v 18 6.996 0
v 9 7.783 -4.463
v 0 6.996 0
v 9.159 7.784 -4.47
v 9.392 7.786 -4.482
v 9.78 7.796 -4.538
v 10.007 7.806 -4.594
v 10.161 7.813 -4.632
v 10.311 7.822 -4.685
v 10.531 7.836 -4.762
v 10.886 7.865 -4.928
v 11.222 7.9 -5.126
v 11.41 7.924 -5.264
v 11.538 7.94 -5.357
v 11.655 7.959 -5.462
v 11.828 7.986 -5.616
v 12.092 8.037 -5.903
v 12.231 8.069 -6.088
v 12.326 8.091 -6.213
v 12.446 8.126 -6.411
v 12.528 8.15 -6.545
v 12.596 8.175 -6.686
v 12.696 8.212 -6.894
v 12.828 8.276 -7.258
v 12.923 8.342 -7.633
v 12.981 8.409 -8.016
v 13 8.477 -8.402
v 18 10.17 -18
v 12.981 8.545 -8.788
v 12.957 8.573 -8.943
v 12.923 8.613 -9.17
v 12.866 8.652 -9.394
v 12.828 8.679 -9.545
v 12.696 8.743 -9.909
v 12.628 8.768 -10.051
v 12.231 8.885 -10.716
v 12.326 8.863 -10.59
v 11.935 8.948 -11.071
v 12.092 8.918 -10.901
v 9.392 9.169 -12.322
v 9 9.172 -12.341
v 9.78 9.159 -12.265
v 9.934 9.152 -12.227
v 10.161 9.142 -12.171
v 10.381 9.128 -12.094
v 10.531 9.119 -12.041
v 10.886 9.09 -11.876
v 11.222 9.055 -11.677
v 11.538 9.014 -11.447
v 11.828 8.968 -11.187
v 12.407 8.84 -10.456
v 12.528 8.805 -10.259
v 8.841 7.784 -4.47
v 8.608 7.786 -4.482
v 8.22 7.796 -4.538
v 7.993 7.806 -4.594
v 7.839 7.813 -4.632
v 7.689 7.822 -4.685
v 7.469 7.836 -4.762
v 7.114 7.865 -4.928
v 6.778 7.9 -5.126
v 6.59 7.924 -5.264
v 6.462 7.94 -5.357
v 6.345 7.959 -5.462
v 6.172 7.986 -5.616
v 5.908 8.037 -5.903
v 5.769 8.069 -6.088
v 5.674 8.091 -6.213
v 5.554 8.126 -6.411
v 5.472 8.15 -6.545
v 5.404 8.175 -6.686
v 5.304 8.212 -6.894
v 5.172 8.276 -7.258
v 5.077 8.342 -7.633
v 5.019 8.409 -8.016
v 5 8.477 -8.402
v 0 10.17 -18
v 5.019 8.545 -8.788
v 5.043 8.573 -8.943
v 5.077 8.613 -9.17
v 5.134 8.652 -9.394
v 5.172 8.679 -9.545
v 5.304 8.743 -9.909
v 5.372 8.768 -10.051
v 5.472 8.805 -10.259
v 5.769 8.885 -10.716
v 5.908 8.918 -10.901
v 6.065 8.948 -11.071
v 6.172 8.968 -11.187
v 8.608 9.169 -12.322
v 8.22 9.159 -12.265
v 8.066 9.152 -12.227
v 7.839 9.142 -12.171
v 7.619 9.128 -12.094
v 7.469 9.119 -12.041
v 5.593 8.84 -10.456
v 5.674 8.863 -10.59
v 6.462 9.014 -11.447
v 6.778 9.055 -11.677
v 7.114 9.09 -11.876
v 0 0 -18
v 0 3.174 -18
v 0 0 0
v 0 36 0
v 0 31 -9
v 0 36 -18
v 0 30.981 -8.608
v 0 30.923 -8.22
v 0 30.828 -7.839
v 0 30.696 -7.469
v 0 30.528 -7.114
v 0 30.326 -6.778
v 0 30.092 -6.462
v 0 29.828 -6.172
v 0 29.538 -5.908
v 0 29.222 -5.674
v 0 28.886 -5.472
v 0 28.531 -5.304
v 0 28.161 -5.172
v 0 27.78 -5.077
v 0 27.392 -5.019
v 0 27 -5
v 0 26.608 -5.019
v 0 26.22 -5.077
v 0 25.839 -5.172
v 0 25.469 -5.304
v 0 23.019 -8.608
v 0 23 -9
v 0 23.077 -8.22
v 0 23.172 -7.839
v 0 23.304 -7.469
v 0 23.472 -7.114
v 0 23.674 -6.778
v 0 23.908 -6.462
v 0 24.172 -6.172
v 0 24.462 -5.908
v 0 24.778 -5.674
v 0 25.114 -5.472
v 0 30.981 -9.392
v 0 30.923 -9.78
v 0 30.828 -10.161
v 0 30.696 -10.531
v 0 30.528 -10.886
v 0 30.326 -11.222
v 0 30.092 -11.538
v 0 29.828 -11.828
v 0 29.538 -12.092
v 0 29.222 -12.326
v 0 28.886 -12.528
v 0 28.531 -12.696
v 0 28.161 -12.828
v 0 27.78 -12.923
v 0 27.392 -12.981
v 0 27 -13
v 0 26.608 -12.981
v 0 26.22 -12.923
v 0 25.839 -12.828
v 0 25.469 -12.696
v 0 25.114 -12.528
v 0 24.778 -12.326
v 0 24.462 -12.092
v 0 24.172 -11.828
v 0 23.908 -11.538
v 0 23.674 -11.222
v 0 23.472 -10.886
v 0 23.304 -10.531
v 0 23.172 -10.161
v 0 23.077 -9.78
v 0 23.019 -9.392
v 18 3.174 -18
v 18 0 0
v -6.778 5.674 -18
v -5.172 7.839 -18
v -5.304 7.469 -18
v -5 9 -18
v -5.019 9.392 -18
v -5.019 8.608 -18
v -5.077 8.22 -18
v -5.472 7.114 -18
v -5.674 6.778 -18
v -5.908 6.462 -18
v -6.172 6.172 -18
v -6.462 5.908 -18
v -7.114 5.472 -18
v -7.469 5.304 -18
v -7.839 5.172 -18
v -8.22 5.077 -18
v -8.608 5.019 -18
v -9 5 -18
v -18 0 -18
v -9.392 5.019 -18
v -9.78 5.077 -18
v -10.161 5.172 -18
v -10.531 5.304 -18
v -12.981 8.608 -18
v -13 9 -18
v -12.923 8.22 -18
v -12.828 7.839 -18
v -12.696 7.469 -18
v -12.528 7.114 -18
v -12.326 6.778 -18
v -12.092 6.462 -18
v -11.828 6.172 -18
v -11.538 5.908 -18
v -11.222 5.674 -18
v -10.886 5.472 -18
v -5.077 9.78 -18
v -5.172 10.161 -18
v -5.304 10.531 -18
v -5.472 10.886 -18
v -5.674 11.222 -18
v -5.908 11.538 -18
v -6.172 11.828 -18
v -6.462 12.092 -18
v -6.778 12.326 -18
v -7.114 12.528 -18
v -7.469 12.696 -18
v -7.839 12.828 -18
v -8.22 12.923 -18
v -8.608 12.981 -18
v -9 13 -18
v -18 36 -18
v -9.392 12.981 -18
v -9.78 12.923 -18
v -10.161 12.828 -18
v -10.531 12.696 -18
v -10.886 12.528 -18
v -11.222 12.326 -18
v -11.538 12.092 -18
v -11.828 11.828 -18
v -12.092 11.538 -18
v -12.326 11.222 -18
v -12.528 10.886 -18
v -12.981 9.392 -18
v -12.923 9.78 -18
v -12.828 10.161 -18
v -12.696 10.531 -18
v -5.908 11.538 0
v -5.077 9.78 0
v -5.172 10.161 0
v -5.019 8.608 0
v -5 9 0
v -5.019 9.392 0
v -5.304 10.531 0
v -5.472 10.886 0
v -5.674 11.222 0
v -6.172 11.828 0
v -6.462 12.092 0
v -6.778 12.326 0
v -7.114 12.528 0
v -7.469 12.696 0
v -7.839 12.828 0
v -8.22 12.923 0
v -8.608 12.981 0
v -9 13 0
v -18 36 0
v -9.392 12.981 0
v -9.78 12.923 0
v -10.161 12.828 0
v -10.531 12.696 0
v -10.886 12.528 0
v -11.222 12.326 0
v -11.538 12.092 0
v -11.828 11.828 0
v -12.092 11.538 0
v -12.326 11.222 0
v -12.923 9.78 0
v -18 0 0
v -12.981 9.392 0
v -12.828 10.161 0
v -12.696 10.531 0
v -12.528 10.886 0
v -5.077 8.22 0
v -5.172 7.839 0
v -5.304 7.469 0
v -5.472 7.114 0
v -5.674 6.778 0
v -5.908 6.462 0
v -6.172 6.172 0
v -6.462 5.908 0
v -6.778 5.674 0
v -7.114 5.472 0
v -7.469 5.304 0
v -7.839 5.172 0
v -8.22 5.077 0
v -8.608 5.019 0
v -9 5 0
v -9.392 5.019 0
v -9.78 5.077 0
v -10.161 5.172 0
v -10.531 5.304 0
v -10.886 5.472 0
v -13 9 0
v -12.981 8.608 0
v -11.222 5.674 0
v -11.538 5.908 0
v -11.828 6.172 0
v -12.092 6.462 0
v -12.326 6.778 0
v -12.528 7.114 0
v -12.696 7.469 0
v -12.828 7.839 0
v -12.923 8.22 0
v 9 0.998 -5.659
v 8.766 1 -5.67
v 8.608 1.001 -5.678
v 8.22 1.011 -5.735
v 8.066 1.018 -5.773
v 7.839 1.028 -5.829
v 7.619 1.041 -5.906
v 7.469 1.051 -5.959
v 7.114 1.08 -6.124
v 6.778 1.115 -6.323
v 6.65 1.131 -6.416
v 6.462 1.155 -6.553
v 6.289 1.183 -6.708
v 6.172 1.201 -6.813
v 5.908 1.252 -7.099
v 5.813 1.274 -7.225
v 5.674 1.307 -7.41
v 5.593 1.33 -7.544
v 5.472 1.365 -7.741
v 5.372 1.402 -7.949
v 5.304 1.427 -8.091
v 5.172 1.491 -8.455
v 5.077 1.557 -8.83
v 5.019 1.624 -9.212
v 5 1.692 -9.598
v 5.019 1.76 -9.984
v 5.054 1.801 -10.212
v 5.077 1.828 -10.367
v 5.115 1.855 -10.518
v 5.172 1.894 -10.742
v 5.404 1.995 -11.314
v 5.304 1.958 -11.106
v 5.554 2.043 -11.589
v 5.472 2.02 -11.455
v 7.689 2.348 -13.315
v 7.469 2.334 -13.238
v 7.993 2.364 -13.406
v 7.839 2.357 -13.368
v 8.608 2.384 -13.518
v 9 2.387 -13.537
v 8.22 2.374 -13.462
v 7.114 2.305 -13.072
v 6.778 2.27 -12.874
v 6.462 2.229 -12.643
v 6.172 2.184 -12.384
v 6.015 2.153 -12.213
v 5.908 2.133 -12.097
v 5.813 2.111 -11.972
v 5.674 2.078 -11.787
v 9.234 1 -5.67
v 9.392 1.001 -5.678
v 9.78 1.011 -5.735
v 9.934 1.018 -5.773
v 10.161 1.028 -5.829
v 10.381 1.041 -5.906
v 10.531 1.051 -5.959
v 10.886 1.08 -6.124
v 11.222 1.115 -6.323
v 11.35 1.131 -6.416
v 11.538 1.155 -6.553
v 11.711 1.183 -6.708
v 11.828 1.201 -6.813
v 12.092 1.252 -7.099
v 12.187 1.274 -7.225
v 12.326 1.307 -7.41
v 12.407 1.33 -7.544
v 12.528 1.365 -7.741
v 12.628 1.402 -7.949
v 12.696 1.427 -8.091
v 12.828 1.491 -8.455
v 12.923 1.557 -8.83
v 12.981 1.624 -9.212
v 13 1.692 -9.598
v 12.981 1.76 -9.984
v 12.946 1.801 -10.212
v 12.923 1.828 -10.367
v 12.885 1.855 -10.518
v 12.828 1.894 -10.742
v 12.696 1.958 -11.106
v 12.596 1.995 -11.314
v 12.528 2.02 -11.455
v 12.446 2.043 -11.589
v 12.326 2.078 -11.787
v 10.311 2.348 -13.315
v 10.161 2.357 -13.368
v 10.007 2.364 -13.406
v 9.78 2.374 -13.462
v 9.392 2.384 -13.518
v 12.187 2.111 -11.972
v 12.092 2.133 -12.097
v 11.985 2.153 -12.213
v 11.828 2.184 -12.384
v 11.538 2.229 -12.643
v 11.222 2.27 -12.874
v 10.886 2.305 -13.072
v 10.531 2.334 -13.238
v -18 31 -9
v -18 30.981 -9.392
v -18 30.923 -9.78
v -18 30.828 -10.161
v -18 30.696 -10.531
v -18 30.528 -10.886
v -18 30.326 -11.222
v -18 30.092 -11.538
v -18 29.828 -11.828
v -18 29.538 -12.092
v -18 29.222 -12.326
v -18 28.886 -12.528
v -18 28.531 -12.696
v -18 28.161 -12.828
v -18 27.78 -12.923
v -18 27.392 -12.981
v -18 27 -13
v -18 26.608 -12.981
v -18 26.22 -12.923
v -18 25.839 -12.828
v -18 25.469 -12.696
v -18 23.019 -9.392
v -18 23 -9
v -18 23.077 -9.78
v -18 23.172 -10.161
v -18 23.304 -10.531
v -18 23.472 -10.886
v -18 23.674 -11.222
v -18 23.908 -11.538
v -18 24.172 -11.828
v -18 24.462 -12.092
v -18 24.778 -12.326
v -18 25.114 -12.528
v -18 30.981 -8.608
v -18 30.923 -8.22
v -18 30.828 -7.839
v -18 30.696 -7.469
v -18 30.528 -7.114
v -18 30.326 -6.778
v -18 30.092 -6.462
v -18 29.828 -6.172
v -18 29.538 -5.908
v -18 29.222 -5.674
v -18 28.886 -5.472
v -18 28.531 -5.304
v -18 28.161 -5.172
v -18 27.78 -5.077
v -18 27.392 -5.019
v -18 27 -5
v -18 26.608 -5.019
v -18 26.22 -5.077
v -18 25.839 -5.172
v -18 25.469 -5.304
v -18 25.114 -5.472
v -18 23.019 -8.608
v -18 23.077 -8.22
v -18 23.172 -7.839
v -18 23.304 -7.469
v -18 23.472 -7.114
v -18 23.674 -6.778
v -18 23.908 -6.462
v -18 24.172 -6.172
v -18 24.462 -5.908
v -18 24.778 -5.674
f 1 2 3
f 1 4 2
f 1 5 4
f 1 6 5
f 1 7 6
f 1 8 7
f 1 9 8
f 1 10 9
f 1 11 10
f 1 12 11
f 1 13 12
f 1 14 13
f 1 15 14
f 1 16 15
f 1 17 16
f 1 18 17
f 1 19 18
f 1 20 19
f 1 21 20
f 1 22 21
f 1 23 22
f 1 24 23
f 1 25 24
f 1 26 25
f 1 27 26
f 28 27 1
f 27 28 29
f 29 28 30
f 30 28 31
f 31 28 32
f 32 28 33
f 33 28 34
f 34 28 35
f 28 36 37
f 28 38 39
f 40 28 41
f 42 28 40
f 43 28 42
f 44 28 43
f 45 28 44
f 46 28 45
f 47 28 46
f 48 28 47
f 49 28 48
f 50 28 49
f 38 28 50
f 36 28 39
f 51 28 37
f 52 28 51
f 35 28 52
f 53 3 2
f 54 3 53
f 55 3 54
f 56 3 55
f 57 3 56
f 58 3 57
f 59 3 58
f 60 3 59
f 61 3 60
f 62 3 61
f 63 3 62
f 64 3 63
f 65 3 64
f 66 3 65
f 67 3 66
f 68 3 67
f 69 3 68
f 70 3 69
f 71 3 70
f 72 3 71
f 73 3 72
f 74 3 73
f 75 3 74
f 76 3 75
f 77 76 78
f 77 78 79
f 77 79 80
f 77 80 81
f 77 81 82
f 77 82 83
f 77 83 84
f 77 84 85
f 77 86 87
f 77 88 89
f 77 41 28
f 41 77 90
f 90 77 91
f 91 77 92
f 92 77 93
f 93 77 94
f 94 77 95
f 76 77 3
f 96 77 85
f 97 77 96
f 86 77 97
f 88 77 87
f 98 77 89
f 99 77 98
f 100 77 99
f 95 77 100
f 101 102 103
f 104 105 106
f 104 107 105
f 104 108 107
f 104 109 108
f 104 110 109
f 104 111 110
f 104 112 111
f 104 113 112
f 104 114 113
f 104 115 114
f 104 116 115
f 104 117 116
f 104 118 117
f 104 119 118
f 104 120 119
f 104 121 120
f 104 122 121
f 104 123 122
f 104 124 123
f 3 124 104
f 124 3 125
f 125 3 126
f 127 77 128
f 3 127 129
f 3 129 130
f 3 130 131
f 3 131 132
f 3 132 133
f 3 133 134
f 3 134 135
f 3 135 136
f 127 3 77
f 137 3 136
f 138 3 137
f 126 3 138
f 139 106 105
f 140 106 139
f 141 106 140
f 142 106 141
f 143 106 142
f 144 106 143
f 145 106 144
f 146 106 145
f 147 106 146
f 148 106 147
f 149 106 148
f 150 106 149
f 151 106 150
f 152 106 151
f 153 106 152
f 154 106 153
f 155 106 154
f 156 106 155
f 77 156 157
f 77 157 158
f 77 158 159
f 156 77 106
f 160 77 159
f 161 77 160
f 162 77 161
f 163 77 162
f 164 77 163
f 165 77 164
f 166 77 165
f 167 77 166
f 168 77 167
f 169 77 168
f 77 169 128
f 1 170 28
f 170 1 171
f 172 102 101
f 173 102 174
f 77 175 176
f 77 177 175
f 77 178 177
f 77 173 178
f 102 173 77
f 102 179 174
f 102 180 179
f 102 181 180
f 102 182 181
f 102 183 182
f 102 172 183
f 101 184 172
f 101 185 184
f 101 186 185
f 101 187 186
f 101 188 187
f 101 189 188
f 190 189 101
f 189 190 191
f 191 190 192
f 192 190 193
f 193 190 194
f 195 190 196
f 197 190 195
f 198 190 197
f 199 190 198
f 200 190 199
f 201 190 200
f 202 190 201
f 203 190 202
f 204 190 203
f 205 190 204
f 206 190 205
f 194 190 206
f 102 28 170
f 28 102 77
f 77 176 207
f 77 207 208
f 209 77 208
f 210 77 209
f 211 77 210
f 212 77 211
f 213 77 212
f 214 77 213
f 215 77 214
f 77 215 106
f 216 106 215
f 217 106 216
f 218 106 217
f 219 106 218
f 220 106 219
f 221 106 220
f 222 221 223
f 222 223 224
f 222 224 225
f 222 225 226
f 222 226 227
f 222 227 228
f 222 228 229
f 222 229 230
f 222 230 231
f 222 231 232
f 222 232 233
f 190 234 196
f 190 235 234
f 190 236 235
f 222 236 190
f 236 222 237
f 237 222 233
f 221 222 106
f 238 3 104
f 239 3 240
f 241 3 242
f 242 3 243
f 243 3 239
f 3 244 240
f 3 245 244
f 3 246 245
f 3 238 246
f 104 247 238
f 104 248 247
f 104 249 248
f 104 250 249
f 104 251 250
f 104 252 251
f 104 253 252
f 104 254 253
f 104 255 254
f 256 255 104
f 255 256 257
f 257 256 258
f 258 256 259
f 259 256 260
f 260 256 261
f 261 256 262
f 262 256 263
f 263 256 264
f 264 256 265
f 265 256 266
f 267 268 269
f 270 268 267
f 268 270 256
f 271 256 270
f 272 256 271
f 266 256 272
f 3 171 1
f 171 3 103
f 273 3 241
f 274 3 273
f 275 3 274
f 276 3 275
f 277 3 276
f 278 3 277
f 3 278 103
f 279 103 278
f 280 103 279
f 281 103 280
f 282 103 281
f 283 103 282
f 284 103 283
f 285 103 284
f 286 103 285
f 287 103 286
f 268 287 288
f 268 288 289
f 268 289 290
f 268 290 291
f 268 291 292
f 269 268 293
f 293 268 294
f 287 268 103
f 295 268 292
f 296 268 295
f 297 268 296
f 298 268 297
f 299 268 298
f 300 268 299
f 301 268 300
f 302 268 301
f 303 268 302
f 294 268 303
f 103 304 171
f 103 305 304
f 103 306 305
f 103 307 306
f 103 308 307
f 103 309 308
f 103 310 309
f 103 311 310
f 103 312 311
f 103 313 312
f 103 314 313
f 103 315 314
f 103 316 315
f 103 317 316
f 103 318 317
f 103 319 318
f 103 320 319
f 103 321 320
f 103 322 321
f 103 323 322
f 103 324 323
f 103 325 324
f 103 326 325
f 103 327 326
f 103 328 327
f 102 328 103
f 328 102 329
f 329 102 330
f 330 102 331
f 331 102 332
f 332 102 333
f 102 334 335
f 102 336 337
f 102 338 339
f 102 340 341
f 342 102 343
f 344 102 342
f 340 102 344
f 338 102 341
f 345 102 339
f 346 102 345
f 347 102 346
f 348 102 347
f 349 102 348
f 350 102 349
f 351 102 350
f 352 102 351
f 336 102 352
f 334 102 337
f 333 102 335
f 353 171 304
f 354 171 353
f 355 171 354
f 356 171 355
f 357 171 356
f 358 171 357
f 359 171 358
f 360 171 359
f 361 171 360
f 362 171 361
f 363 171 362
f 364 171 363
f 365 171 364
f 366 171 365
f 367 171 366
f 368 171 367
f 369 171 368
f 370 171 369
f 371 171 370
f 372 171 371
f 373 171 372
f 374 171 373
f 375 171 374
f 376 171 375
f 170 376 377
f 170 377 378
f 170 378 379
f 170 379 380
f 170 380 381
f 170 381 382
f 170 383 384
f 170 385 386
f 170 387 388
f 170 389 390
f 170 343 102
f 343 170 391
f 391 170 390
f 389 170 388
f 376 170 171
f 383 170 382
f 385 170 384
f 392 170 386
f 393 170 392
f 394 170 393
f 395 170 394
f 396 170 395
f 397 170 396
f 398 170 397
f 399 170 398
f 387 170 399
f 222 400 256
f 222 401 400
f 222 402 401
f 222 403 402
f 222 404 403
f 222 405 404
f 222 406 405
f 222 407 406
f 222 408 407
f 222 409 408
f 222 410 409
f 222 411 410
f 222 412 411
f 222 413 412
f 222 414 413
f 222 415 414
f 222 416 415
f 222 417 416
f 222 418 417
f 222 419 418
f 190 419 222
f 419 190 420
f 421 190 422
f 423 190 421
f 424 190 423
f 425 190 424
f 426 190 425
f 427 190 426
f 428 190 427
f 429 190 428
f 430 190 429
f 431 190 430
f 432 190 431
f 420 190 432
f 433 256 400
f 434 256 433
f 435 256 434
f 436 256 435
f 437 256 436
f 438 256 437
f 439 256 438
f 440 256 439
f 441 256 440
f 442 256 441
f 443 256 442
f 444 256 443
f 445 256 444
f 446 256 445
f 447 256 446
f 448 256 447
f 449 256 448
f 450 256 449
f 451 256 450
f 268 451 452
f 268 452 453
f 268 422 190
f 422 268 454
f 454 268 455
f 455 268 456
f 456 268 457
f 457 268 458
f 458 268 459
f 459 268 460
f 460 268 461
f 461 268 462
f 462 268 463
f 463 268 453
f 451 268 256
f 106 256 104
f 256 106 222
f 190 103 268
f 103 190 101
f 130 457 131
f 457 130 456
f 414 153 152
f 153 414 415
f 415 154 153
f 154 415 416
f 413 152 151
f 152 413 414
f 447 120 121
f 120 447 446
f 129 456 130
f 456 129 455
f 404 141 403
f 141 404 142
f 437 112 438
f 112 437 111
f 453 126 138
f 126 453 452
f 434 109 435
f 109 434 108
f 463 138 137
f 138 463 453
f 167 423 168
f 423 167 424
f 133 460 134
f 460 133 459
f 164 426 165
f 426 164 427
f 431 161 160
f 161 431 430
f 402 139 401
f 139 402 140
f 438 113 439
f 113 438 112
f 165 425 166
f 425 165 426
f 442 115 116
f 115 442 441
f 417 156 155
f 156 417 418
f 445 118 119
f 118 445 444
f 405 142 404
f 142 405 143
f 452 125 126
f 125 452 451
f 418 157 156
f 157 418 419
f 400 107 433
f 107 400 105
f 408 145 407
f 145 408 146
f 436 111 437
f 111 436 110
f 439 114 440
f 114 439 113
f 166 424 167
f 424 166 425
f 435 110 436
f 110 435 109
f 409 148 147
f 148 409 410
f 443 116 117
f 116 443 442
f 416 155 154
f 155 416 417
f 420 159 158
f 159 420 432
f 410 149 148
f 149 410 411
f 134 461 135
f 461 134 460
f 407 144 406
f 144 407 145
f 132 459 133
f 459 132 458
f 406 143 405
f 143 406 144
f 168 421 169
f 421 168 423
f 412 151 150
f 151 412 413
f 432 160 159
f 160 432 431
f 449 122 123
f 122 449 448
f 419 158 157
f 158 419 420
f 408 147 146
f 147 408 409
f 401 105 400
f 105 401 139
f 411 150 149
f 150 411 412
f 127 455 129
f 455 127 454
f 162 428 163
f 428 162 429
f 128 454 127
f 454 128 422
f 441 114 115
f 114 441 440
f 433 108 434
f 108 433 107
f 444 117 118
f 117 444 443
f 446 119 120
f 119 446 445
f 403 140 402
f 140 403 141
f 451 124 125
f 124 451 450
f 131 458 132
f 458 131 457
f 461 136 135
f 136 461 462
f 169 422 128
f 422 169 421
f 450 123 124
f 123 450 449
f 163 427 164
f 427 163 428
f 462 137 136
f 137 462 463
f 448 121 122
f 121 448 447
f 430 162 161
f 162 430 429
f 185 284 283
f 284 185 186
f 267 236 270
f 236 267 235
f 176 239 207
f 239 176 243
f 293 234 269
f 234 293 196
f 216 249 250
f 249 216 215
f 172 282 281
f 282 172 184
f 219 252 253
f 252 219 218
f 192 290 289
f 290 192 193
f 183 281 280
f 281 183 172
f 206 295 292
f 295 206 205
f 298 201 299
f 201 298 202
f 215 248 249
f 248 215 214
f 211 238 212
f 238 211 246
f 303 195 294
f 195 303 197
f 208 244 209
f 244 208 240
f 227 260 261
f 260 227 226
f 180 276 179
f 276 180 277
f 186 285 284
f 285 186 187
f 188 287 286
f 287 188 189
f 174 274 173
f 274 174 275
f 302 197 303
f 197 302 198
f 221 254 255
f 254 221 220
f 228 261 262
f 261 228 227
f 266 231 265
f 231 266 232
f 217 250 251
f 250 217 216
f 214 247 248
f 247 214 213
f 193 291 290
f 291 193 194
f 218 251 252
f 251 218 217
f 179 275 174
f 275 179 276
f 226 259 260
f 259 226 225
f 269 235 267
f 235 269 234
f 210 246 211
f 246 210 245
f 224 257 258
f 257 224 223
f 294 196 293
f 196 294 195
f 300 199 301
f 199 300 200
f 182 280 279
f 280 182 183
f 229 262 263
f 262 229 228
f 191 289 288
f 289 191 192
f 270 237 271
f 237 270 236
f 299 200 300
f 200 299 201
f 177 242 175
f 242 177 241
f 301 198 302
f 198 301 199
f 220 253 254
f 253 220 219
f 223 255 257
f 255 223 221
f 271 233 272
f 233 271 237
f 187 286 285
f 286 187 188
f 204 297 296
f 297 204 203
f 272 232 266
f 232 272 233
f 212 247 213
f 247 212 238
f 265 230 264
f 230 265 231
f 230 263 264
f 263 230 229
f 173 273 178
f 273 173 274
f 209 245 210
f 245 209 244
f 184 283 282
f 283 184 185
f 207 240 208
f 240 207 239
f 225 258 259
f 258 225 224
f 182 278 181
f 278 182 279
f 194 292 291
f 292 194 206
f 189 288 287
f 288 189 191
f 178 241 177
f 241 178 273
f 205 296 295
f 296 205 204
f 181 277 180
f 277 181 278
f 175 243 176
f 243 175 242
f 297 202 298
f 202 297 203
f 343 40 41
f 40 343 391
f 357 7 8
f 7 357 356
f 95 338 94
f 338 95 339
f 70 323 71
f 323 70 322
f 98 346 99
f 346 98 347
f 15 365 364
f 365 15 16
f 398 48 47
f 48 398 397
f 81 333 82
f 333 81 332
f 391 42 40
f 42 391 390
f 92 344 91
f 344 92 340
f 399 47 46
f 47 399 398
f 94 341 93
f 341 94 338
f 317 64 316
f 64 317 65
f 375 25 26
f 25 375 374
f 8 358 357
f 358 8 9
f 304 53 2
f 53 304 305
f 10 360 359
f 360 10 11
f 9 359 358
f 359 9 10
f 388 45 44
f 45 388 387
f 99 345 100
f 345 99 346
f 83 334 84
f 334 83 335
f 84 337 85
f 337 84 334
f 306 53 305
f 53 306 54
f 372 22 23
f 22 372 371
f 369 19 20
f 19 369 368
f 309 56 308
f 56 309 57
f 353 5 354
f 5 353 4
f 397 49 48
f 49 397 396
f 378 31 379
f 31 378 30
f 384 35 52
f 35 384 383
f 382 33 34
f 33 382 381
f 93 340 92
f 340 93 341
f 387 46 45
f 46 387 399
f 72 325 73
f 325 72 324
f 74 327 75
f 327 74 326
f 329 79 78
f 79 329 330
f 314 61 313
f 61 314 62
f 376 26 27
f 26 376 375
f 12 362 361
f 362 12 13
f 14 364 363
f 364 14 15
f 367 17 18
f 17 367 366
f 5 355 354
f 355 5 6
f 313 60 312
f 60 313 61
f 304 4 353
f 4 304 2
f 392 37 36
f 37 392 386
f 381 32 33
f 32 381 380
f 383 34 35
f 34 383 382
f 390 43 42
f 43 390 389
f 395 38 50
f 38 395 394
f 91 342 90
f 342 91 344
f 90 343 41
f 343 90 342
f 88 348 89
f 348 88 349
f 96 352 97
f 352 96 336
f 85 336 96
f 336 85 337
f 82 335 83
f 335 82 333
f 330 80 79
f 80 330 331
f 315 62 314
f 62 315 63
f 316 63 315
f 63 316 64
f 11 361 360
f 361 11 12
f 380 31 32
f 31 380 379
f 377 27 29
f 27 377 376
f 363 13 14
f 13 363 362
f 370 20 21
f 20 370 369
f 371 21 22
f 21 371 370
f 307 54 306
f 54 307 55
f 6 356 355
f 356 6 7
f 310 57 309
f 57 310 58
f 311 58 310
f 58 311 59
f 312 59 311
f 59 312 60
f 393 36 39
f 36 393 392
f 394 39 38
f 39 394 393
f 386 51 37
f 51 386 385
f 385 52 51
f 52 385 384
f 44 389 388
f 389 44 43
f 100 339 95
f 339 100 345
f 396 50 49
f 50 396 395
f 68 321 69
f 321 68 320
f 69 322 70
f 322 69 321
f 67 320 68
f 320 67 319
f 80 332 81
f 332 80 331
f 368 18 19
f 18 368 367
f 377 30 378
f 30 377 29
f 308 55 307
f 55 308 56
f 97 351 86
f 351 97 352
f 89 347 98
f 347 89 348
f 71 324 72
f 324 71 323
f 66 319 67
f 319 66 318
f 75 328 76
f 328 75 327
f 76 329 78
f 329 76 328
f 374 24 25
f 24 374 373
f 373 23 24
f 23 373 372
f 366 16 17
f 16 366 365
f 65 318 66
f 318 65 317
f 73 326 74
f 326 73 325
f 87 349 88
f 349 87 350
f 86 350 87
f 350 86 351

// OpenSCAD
$fn= $preview ? 32 : 64;
part = "bottom_corner"; // [bottom_corner, bottom_corner_mirrored,top_corner,mounting_block,rail_mount,all]
nut_width_with_margin=18;
nut_height_with_margin=8;
rod_diameter=8;
angle_of_inclanation=10;
h=nut_height_with_margin;
w=nut_width_with_margin;
d=rod_diameter;
mounting_hole=5;
width=150.0;
length=400;
a=angle_of_inclanation;

module bottom_corner(){
    difference(){
        union(){
            linear_extrude(w)polygon([[0,w-w*sin(a)-h*cos(a)],[0,0],[w,w*tan(a)],[w,w*tan(a)+w-w*sin(a)-h*cos(a)]]);
            translate([0,0,-w])cube([w,2*w,w]);
    }
    translate([w/2,1.5*w,-w-1])cylinder(h=w+2,d=d);
    translate([-1,w/2,-w/2])rotate([0,90,0])cylinder(h=w+2,d=d);
    translate([w/2,(w*tan(a)+w-w*sin(a)-h*cos(a))/2,w/2])rotate([90,0,a])cylinder(h=2*w,d=d,center=true);
    *mirror([0,0,1])cube([h,w,w]);
}
}
    Ax=h*sin(a);
    Ay=w;
    Dy=0;
    Dx=(h+w/cos(a))*sin(a);
    Bx=Ax+w*cos(a);
    By=Ay+w*sin(a);
    Cx=Dx+w*cos(a);
    Cy=Dy+w*sin(a);
    dw=(Cx+Ax)/2;
Hy=By+h*cos(a);
dh1=2*w-(w*tan(a)+w-w*sin(a)-h*cos(a))/2;
dh2=Hy-By/2;
h0=((width-2*h-w)/2-dw)/tan(a);
height=h0+dh1+dh2;
td=(w-w*sin(a)-h*cos(a))*cos(a);
rl=2*h+h0/cos(a)+0.5*w/cos(a)+td/2;
dist=(sqrt((Cx+Ax)*(Cx+Ax)+(By-w)*(By-w)))/2;
echo(dist);
module top_corner(){
     difference(){
    linear_extrude(w)polygon([[Ax,Ay],[Bx,By],[Cx,Cy],[Dx,Dy],[-Dx,Dy],[-Cx,Cy],[-Bx,By],[-Ax,Ay]]);
    translate([0,w/2,-1])cylinder(h=w+2, d=d);
    translate([(Ax+Cx)/2,(Ay+Cy)/2,w/2])rotate([90,0,a])cylinder(h=w/cos(a)+2, d=d,center=true);    
    translate([(-Ax-Cx)/2,(Ay+Cy)/2,w/2])rotate([90,0,-a])cylinder(h=w/cos(a)+2, d=d,center=true);
    translate([(Cx+Bx)/2,(Cy+By)/2,w/2])rotate([-a,90,0])cylinder(h=w,d=mounting_hole,center=true);
     }
}
module mounting_block()
{
    difference()
    {
        cube([w,w,w]);
        translate([w/2,w/2,w/2])cylinder(h=w+2,d=d,center=true);
         translate([0,w/2,w/2])rotate([0,90,0])cylinder(h=w+1,d=mounting_hole,center=true);
    }
    }
module rail_mount()
    {
       rotate([90,0,0]) difference(){
       rotate([0,0,180/8])cylinder(d=w/cos(180/8),h=w+dist,$fn=8);
       translate([0,0,dist+w/2])rotate([90,0,45]) cylinder(d=d,h=w+2,center=true);
       translate([0,0,0.5*w])rotate([90,0,-45]) cylinder(d=d,h=w+2,center=true);
           cylinder(h=w,d=mounting_hole,center=true);
            }
        }
if (part=="bottom_corner") {
    rotate([0,90,0])bottom_corner();
}
if (part=="bottom_corner_mirrored") {
    mirror([1,0,0])rotate([0,-90,0])bottom_corner();
}
if (part=="top_corner") {
    top_corner();
}
if (part=="mounting_block") {
    mounting_block();
}
if (part=="rail_mount") {
    rail_mount();
}
if (part=="all")
{
    mirror([0,1,1])bottom_corner();
    translate([width-2*h,0,0])mirror([1,0,0])mirror([0,1,1])bottom_corner();
    translate([0,length,0])mirror([0,1,0])mirror([0,1,1])bottom_corner();
    translate([width-2*h,length,0])mirror([0,1,0])mirror([1,0,0])mirror([0,1,1])bottom_corner();
    translate([width/2-h,0,h0-By/2-(w*tan(a)+w-w*sin(a)-h*cos(a))/2])rotate([90,0,0])top_corner();
    translate([width/2-h,length+w,h0-By/2-(w*tan(a)+w-w*sin(a)-h*cos(a))/2])rotate([90,0,0])top_corner();
    color("blue")
    {
        translate([w/2,-h,-1.5*w])rotate([-90,0,0])cylinder(d=d,h=length+2*h);
        translate([width-2*h-w/2,-h,-1.5*w])rotate([-90,0,0])cylinder(d=d,h=length+2*h);
        translate([width/2-h,-h-w,w/2+h0-By/2-(w*tan(a)+w-w*sin(a)-h*cos(a))/2])rotate([-90,0,0])cylinder(d=d,h=length+2*w+2*h);
        translate([-h,w/2,-w/2])rotate([0,90,0])cylinder(d=d,h=width);
        translate([-h,length-w/2,-w/2])rotate([0,90,0])cylinder(d=d,h=width);
        translate([w/2,-w/2,-(w*tan(a)+w-w*sin(a)-h*cos(a))/2])rotate([0,a,0])translate([0,0,-h-0.5*td])cylinder(d=d,h=rl);
        
        translate([width-2*h,0,0])mirror([1,0,0])translate([w/2,-w/2,-(w*tan(a)+w-w*sin(a)-h*cos(a))/2])rotate([0,a,0])translate([0,0,-h-cos(a)*(w-w*sin(a)-h*cos(a))/2])cylinder(d=d,h=rl);
        
        translate([0,length,0])mirror([0,1,0])translate([w/2,-w/2,-(w*tan(a)+w-w*sin(a)-h*cos(a))/2])rotate([0,a,0])translate([0,0,-h-cos(a)*(w-w*sin(a)-h*cos(a))/2])cylinder(d=d,h=rl);
        
        translate([width-2*h,length,0])mirror([0,1,0])mirror([1,0,0])translate([w/2,-w/2,-(w*tan(a)+w-w*sin(a)-h*cos(a))/2])rotate([0,a,0])translate([0,0,-h-cos(a)*(w-w*sin(a)-h*cos(a))/2])cylinder(d=d,h=rl);

        }
    }

echo("-----------------------------");
echo(str("Machine height = ", height,"mm"));
echo(str("Rod length = ",rl,"mm"));
echo("-----------------------------");
